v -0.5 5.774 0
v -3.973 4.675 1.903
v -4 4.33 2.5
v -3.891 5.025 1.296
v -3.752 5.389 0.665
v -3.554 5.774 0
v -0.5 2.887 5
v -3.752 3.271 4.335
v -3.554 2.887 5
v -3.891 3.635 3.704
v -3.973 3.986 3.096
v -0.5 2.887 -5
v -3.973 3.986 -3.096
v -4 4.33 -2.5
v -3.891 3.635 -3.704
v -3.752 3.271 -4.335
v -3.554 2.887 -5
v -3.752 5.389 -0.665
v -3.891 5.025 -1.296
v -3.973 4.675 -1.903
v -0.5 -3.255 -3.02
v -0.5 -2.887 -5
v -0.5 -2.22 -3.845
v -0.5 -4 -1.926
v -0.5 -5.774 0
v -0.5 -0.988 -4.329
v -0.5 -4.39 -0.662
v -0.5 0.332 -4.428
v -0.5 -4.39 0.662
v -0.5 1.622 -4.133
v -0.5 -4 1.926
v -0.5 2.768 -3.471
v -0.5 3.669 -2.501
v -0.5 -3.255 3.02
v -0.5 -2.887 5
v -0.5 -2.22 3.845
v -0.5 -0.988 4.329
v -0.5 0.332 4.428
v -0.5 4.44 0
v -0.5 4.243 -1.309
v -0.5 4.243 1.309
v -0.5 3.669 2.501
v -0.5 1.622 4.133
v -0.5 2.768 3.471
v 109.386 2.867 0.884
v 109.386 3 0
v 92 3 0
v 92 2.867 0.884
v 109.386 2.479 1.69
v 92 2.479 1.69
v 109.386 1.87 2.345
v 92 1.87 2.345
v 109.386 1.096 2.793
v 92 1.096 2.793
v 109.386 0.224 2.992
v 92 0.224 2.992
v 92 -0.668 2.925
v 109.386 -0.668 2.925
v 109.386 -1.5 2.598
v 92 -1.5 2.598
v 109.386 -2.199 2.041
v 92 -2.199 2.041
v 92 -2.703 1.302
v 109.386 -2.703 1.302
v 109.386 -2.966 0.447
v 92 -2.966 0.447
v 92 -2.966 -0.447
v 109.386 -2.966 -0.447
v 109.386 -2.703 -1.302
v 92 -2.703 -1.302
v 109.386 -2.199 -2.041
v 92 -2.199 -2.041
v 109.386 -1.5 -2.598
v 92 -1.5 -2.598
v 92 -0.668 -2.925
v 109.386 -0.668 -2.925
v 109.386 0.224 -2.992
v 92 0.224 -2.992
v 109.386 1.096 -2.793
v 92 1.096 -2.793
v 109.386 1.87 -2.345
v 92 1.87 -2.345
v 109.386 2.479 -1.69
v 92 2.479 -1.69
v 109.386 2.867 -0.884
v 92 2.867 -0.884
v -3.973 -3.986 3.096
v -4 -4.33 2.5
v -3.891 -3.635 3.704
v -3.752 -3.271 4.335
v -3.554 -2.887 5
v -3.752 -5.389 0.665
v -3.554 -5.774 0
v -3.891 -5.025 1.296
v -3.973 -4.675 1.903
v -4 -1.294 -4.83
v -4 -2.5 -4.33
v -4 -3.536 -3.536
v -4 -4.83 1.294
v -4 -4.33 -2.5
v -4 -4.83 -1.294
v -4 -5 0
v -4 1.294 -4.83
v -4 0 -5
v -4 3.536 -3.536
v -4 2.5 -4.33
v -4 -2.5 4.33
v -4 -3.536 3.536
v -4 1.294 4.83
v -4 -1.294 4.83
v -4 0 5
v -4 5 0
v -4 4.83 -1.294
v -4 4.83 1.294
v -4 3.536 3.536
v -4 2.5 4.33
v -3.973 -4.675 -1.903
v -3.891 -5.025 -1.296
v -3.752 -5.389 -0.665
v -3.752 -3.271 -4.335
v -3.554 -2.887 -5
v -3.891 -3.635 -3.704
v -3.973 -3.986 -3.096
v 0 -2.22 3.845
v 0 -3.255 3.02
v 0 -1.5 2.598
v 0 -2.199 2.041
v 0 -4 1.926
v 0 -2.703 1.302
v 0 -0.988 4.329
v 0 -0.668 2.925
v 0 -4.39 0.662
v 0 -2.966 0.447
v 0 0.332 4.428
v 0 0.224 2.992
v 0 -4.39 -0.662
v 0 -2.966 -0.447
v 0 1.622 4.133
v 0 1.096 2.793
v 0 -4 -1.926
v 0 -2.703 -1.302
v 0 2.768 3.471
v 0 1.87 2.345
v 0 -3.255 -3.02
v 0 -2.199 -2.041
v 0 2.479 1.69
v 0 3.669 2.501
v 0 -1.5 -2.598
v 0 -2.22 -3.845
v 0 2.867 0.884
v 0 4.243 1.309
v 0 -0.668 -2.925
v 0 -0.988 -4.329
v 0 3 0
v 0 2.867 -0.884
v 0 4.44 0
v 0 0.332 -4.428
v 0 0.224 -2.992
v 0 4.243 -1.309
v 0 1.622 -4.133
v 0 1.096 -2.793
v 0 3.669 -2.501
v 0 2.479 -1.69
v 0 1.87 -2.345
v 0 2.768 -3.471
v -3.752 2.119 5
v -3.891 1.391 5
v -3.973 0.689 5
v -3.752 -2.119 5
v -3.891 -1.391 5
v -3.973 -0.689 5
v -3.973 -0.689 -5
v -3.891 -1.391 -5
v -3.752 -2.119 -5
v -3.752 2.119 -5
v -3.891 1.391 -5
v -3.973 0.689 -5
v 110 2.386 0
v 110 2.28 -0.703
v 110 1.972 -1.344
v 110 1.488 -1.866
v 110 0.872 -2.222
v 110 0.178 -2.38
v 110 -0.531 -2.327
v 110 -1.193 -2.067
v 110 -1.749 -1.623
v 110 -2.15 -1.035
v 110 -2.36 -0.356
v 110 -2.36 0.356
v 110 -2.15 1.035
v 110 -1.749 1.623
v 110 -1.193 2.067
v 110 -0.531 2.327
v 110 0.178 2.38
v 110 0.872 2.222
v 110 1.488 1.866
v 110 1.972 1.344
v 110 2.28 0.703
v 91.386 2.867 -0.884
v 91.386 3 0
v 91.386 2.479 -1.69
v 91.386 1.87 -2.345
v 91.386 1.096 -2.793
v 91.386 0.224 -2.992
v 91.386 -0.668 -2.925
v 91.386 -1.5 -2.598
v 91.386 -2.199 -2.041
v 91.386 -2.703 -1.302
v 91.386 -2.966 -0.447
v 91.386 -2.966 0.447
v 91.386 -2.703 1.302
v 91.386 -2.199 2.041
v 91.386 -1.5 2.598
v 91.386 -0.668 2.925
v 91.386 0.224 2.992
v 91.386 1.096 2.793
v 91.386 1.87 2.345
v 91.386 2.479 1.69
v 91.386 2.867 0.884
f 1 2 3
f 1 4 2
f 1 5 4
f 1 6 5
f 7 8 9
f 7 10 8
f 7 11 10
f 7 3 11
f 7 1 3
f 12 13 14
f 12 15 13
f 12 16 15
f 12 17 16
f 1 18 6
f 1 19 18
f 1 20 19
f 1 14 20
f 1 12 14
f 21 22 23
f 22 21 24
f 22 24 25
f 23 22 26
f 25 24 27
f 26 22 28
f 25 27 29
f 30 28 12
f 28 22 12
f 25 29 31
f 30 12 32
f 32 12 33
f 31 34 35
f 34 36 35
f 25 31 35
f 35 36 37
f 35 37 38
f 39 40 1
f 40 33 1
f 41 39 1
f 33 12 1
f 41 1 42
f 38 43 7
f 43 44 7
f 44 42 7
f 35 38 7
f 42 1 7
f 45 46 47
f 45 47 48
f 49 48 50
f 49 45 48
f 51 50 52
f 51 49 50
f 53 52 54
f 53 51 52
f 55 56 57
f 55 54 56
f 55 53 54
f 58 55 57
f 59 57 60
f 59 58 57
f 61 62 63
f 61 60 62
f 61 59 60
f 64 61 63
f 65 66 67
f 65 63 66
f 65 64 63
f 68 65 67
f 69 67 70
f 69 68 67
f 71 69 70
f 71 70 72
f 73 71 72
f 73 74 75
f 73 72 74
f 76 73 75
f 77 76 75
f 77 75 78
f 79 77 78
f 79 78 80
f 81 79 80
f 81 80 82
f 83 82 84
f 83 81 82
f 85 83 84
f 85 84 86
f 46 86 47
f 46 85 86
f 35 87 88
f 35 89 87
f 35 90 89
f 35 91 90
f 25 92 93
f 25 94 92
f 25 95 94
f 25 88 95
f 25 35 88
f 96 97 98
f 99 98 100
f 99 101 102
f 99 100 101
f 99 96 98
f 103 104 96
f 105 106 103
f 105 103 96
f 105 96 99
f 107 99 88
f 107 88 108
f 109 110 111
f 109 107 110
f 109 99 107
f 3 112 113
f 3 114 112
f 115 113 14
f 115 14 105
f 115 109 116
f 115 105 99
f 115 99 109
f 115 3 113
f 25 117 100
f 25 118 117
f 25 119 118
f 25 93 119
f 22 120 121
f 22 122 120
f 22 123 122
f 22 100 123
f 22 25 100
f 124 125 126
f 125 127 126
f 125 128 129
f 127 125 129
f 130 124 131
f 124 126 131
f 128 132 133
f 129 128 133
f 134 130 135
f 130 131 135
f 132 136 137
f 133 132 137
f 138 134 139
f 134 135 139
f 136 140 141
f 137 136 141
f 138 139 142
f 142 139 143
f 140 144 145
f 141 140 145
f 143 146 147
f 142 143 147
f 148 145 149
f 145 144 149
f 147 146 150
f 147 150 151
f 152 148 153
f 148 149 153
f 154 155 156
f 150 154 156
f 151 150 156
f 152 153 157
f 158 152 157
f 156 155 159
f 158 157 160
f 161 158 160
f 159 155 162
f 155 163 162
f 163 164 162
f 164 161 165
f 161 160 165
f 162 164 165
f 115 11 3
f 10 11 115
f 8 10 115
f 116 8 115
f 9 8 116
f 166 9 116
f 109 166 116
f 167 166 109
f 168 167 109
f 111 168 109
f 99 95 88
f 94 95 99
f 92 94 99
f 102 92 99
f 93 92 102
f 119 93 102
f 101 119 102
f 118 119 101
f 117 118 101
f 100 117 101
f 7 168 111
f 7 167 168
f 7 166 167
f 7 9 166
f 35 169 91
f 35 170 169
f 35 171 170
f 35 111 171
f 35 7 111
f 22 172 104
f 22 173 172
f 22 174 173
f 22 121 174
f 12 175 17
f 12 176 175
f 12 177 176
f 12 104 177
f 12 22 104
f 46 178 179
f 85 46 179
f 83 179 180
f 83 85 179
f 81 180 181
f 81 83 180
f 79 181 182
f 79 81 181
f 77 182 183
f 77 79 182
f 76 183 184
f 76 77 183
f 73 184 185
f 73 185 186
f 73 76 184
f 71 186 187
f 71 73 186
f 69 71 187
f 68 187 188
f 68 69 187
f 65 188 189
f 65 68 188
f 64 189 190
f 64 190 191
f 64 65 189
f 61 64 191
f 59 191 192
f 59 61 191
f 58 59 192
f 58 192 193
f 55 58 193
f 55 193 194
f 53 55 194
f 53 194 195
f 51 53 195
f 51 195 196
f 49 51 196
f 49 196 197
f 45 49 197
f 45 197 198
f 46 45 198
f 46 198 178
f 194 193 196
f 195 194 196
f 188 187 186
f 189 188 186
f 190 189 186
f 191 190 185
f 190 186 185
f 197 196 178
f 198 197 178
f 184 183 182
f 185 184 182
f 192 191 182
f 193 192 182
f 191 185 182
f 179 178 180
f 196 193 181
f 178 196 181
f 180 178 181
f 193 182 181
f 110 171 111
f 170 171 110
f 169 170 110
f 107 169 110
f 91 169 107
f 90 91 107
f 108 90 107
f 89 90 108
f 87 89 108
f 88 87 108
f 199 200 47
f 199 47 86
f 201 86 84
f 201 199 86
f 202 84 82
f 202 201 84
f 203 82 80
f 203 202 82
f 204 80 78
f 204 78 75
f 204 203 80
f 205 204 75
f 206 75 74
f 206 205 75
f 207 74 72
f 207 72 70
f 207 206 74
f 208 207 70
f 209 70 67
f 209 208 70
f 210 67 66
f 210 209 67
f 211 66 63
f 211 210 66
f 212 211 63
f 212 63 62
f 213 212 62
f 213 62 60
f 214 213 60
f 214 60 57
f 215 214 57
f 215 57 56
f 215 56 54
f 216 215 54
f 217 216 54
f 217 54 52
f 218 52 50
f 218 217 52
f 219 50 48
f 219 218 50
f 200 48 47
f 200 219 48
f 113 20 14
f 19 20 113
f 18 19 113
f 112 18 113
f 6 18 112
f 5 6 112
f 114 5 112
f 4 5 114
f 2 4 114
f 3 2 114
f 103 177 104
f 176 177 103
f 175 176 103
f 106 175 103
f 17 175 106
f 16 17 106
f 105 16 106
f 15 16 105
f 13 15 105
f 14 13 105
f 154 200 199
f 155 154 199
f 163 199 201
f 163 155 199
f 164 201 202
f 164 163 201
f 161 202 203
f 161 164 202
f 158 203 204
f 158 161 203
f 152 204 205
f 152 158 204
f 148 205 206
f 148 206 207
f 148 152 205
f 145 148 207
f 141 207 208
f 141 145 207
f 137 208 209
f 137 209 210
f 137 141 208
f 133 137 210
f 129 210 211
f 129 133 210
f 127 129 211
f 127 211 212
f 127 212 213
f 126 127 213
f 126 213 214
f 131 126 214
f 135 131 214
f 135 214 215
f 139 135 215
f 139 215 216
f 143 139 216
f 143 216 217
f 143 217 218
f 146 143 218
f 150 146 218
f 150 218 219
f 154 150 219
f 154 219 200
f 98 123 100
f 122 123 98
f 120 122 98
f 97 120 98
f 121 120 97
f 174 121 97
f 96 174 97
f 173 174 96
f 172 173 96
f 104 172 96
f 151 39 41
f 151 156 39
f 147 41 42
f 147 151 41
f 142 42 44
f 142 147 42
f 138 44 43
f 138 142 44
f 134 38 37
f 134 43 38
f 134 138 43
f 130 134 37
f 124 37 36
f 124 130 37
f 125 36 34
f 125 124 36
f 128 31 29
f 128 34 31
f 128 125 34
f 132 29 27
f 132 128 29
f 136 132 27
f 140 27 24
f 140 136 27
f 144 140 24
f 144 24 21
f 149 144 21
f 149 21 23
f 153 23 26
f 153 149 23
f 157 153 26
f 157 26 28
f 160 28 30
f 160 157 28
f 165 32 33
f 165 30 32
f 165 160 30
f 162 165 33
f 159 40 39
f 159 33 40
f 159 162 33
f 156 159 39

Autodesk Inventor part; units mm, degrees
ref_plane "YZ Plane" through (0, 0, 0) normal (1, 0, 0) x (0, 1, 0)
ref_plane "XZ Plane" through (0, 0, 0) normal (0, 1, 0) x (-1, 0, 0)
sketch "Sketch1" plane through (0, 0, 0) normal (0, 0, 1) x (1, 0, 0)
  line L0 (0, 4.44) -> (0, 3)
  line L1 (92, 3) -> (110, 3)
  line L2 (110, 3) -> (110, 0)
  line L3 (110, 0) -> (-0.5001, 0)
  line L4 (-22.6001, 0) -> (132.1, 0) projected
  line L5 (-0.5001, 0) -> (-0.5001, 4.44)
  line L6 (-0.5001, 4.44) -> (0, 4.44)
  line L7 (92, 3) -> (91.3864, 3)
  line L8 (91.3864, 3) -> (0, 3)
  line L9 (0, -0.888) -> (0, 5.328) projected
  dimension "d0" = 110
  dimension "d1" = 18
  dimension "d2" = 6
  dimension "d9" = 0.5001
  dimension "d10" = 8.88
  dimension "d13" = 0.6136
  dimension "d14" = 6
revolve "Body" add sketch "Sketch1" angle 360 about axis through (110, 0, 0) along (-1, 0, 0)
sketch "Sketch2" plane through (-0.5001, 0, 0) normal (-1, 0, 0) x (0, 0, 1)
  line L0 (0, 5.7735) -> (5, 2.8868)
  line L1 (5, 2.8868) -> (5, -2.8868)
  line L2 (5, -2.8868) -> (0, -5.7735)
  line L3 (0, -5.7735) -> (-5, -2.8868)
  line L4 (-5, -2.8868) -> (-5, 2.8868)
  line L5 (-5, 2.8868) -> (0, 5.7735)
  point P0 (0, 0)
  point P1 (0, 0)
  dimension "d11" = 10
extrude "Head" add sketch "Sketch2" along normal blind 3.5
sketch "Sketch4" plane through (0, 0, 0) normal (0, 0, 1) x (1, 0, 0)
  line L0 (-4.0001, 5) -> (-4.0001, 5.7735)
  line L1 (-4.0001, 5.7735) -> (-3.5535, 5.7735)
  line L2 (-3.5535, 5.7735) -> (-4.0001, 5)
  line L3 (-4.7001, 0) -> (0.1999, 0) projected
  line L4 (-0.5001, 5.7735) -> (-4.0001, 5.7735) projected
  line L5 (-4.0001, 2.8868) -> (-4.0001, 5.7735) projected
  dimension "d5" = 30
  dimension "d19" = 10
revolve "Chamfer1" cut sketch "Sketch4" angle 360 about axis through (-10, 0, 0) along (1, 0, 0)
thread "Thread" size "M6x1" class "6g" standard "ISO Metric profile" length 18
chamfer "Chamfer2" distance 0.6135 distance2 0.6136 1 edges at (110, -3, 0) measured on face at (110, 0.3546, -0.935)
ref_plane "Work Plane1" through (1.525, 0, 0) normal (0, 0, 1) x (1, 0, 0)
equation "\"d1\" = GEL"
equation "\"d2\" = GD"
equation "\"d10\" = SD2"
equation "\"d14\" = BDM"
equation "\"d11\" = SW"
equation "\"d3\" = KOH - SD"
equation "\"d5\" = ANG1"
equation "\"d19\" = SW0"
equation "\"d15\" = GEL"
equation "\"d6\" = -0.5 * SPD + 0.5 * GD"
equation "\"GD\" = NND"
equation "\"BDM\" = NND"
equation "\"KOH\" = 4"
equation "\"GEL\" = 18"
equation "\"SW\" = 10"
equation "\"SW0\" = SW"
equation "\"SPD\" = NND - 1.2269 * PTC"
equation "\"SD2\" = 8.88"
equation "\"SD\" = 0.5"
equation "\"ANG1\" = 30deg"
equation "\"GAL\" = 0.61345 * PTC"
equation "\"GUL\" = 0.61345 * PTC"
equation "\"RR\" = 0.25"
equation "\"GD1\" = THREADDIA - 1.2269 * PTC"
equation "\"THREADDIA\" = 6"
equation "\"SDH\" = SD2"
equation "\"TOA\" = 30deg"
equation "\"PTC\" = 1"
equation "\"NND\" = 6"
equation "\"E0\" = 1.155 * SW"
properties part number "ISO 4014 - M6 x 60" material "Stainless Steel, 440C"
